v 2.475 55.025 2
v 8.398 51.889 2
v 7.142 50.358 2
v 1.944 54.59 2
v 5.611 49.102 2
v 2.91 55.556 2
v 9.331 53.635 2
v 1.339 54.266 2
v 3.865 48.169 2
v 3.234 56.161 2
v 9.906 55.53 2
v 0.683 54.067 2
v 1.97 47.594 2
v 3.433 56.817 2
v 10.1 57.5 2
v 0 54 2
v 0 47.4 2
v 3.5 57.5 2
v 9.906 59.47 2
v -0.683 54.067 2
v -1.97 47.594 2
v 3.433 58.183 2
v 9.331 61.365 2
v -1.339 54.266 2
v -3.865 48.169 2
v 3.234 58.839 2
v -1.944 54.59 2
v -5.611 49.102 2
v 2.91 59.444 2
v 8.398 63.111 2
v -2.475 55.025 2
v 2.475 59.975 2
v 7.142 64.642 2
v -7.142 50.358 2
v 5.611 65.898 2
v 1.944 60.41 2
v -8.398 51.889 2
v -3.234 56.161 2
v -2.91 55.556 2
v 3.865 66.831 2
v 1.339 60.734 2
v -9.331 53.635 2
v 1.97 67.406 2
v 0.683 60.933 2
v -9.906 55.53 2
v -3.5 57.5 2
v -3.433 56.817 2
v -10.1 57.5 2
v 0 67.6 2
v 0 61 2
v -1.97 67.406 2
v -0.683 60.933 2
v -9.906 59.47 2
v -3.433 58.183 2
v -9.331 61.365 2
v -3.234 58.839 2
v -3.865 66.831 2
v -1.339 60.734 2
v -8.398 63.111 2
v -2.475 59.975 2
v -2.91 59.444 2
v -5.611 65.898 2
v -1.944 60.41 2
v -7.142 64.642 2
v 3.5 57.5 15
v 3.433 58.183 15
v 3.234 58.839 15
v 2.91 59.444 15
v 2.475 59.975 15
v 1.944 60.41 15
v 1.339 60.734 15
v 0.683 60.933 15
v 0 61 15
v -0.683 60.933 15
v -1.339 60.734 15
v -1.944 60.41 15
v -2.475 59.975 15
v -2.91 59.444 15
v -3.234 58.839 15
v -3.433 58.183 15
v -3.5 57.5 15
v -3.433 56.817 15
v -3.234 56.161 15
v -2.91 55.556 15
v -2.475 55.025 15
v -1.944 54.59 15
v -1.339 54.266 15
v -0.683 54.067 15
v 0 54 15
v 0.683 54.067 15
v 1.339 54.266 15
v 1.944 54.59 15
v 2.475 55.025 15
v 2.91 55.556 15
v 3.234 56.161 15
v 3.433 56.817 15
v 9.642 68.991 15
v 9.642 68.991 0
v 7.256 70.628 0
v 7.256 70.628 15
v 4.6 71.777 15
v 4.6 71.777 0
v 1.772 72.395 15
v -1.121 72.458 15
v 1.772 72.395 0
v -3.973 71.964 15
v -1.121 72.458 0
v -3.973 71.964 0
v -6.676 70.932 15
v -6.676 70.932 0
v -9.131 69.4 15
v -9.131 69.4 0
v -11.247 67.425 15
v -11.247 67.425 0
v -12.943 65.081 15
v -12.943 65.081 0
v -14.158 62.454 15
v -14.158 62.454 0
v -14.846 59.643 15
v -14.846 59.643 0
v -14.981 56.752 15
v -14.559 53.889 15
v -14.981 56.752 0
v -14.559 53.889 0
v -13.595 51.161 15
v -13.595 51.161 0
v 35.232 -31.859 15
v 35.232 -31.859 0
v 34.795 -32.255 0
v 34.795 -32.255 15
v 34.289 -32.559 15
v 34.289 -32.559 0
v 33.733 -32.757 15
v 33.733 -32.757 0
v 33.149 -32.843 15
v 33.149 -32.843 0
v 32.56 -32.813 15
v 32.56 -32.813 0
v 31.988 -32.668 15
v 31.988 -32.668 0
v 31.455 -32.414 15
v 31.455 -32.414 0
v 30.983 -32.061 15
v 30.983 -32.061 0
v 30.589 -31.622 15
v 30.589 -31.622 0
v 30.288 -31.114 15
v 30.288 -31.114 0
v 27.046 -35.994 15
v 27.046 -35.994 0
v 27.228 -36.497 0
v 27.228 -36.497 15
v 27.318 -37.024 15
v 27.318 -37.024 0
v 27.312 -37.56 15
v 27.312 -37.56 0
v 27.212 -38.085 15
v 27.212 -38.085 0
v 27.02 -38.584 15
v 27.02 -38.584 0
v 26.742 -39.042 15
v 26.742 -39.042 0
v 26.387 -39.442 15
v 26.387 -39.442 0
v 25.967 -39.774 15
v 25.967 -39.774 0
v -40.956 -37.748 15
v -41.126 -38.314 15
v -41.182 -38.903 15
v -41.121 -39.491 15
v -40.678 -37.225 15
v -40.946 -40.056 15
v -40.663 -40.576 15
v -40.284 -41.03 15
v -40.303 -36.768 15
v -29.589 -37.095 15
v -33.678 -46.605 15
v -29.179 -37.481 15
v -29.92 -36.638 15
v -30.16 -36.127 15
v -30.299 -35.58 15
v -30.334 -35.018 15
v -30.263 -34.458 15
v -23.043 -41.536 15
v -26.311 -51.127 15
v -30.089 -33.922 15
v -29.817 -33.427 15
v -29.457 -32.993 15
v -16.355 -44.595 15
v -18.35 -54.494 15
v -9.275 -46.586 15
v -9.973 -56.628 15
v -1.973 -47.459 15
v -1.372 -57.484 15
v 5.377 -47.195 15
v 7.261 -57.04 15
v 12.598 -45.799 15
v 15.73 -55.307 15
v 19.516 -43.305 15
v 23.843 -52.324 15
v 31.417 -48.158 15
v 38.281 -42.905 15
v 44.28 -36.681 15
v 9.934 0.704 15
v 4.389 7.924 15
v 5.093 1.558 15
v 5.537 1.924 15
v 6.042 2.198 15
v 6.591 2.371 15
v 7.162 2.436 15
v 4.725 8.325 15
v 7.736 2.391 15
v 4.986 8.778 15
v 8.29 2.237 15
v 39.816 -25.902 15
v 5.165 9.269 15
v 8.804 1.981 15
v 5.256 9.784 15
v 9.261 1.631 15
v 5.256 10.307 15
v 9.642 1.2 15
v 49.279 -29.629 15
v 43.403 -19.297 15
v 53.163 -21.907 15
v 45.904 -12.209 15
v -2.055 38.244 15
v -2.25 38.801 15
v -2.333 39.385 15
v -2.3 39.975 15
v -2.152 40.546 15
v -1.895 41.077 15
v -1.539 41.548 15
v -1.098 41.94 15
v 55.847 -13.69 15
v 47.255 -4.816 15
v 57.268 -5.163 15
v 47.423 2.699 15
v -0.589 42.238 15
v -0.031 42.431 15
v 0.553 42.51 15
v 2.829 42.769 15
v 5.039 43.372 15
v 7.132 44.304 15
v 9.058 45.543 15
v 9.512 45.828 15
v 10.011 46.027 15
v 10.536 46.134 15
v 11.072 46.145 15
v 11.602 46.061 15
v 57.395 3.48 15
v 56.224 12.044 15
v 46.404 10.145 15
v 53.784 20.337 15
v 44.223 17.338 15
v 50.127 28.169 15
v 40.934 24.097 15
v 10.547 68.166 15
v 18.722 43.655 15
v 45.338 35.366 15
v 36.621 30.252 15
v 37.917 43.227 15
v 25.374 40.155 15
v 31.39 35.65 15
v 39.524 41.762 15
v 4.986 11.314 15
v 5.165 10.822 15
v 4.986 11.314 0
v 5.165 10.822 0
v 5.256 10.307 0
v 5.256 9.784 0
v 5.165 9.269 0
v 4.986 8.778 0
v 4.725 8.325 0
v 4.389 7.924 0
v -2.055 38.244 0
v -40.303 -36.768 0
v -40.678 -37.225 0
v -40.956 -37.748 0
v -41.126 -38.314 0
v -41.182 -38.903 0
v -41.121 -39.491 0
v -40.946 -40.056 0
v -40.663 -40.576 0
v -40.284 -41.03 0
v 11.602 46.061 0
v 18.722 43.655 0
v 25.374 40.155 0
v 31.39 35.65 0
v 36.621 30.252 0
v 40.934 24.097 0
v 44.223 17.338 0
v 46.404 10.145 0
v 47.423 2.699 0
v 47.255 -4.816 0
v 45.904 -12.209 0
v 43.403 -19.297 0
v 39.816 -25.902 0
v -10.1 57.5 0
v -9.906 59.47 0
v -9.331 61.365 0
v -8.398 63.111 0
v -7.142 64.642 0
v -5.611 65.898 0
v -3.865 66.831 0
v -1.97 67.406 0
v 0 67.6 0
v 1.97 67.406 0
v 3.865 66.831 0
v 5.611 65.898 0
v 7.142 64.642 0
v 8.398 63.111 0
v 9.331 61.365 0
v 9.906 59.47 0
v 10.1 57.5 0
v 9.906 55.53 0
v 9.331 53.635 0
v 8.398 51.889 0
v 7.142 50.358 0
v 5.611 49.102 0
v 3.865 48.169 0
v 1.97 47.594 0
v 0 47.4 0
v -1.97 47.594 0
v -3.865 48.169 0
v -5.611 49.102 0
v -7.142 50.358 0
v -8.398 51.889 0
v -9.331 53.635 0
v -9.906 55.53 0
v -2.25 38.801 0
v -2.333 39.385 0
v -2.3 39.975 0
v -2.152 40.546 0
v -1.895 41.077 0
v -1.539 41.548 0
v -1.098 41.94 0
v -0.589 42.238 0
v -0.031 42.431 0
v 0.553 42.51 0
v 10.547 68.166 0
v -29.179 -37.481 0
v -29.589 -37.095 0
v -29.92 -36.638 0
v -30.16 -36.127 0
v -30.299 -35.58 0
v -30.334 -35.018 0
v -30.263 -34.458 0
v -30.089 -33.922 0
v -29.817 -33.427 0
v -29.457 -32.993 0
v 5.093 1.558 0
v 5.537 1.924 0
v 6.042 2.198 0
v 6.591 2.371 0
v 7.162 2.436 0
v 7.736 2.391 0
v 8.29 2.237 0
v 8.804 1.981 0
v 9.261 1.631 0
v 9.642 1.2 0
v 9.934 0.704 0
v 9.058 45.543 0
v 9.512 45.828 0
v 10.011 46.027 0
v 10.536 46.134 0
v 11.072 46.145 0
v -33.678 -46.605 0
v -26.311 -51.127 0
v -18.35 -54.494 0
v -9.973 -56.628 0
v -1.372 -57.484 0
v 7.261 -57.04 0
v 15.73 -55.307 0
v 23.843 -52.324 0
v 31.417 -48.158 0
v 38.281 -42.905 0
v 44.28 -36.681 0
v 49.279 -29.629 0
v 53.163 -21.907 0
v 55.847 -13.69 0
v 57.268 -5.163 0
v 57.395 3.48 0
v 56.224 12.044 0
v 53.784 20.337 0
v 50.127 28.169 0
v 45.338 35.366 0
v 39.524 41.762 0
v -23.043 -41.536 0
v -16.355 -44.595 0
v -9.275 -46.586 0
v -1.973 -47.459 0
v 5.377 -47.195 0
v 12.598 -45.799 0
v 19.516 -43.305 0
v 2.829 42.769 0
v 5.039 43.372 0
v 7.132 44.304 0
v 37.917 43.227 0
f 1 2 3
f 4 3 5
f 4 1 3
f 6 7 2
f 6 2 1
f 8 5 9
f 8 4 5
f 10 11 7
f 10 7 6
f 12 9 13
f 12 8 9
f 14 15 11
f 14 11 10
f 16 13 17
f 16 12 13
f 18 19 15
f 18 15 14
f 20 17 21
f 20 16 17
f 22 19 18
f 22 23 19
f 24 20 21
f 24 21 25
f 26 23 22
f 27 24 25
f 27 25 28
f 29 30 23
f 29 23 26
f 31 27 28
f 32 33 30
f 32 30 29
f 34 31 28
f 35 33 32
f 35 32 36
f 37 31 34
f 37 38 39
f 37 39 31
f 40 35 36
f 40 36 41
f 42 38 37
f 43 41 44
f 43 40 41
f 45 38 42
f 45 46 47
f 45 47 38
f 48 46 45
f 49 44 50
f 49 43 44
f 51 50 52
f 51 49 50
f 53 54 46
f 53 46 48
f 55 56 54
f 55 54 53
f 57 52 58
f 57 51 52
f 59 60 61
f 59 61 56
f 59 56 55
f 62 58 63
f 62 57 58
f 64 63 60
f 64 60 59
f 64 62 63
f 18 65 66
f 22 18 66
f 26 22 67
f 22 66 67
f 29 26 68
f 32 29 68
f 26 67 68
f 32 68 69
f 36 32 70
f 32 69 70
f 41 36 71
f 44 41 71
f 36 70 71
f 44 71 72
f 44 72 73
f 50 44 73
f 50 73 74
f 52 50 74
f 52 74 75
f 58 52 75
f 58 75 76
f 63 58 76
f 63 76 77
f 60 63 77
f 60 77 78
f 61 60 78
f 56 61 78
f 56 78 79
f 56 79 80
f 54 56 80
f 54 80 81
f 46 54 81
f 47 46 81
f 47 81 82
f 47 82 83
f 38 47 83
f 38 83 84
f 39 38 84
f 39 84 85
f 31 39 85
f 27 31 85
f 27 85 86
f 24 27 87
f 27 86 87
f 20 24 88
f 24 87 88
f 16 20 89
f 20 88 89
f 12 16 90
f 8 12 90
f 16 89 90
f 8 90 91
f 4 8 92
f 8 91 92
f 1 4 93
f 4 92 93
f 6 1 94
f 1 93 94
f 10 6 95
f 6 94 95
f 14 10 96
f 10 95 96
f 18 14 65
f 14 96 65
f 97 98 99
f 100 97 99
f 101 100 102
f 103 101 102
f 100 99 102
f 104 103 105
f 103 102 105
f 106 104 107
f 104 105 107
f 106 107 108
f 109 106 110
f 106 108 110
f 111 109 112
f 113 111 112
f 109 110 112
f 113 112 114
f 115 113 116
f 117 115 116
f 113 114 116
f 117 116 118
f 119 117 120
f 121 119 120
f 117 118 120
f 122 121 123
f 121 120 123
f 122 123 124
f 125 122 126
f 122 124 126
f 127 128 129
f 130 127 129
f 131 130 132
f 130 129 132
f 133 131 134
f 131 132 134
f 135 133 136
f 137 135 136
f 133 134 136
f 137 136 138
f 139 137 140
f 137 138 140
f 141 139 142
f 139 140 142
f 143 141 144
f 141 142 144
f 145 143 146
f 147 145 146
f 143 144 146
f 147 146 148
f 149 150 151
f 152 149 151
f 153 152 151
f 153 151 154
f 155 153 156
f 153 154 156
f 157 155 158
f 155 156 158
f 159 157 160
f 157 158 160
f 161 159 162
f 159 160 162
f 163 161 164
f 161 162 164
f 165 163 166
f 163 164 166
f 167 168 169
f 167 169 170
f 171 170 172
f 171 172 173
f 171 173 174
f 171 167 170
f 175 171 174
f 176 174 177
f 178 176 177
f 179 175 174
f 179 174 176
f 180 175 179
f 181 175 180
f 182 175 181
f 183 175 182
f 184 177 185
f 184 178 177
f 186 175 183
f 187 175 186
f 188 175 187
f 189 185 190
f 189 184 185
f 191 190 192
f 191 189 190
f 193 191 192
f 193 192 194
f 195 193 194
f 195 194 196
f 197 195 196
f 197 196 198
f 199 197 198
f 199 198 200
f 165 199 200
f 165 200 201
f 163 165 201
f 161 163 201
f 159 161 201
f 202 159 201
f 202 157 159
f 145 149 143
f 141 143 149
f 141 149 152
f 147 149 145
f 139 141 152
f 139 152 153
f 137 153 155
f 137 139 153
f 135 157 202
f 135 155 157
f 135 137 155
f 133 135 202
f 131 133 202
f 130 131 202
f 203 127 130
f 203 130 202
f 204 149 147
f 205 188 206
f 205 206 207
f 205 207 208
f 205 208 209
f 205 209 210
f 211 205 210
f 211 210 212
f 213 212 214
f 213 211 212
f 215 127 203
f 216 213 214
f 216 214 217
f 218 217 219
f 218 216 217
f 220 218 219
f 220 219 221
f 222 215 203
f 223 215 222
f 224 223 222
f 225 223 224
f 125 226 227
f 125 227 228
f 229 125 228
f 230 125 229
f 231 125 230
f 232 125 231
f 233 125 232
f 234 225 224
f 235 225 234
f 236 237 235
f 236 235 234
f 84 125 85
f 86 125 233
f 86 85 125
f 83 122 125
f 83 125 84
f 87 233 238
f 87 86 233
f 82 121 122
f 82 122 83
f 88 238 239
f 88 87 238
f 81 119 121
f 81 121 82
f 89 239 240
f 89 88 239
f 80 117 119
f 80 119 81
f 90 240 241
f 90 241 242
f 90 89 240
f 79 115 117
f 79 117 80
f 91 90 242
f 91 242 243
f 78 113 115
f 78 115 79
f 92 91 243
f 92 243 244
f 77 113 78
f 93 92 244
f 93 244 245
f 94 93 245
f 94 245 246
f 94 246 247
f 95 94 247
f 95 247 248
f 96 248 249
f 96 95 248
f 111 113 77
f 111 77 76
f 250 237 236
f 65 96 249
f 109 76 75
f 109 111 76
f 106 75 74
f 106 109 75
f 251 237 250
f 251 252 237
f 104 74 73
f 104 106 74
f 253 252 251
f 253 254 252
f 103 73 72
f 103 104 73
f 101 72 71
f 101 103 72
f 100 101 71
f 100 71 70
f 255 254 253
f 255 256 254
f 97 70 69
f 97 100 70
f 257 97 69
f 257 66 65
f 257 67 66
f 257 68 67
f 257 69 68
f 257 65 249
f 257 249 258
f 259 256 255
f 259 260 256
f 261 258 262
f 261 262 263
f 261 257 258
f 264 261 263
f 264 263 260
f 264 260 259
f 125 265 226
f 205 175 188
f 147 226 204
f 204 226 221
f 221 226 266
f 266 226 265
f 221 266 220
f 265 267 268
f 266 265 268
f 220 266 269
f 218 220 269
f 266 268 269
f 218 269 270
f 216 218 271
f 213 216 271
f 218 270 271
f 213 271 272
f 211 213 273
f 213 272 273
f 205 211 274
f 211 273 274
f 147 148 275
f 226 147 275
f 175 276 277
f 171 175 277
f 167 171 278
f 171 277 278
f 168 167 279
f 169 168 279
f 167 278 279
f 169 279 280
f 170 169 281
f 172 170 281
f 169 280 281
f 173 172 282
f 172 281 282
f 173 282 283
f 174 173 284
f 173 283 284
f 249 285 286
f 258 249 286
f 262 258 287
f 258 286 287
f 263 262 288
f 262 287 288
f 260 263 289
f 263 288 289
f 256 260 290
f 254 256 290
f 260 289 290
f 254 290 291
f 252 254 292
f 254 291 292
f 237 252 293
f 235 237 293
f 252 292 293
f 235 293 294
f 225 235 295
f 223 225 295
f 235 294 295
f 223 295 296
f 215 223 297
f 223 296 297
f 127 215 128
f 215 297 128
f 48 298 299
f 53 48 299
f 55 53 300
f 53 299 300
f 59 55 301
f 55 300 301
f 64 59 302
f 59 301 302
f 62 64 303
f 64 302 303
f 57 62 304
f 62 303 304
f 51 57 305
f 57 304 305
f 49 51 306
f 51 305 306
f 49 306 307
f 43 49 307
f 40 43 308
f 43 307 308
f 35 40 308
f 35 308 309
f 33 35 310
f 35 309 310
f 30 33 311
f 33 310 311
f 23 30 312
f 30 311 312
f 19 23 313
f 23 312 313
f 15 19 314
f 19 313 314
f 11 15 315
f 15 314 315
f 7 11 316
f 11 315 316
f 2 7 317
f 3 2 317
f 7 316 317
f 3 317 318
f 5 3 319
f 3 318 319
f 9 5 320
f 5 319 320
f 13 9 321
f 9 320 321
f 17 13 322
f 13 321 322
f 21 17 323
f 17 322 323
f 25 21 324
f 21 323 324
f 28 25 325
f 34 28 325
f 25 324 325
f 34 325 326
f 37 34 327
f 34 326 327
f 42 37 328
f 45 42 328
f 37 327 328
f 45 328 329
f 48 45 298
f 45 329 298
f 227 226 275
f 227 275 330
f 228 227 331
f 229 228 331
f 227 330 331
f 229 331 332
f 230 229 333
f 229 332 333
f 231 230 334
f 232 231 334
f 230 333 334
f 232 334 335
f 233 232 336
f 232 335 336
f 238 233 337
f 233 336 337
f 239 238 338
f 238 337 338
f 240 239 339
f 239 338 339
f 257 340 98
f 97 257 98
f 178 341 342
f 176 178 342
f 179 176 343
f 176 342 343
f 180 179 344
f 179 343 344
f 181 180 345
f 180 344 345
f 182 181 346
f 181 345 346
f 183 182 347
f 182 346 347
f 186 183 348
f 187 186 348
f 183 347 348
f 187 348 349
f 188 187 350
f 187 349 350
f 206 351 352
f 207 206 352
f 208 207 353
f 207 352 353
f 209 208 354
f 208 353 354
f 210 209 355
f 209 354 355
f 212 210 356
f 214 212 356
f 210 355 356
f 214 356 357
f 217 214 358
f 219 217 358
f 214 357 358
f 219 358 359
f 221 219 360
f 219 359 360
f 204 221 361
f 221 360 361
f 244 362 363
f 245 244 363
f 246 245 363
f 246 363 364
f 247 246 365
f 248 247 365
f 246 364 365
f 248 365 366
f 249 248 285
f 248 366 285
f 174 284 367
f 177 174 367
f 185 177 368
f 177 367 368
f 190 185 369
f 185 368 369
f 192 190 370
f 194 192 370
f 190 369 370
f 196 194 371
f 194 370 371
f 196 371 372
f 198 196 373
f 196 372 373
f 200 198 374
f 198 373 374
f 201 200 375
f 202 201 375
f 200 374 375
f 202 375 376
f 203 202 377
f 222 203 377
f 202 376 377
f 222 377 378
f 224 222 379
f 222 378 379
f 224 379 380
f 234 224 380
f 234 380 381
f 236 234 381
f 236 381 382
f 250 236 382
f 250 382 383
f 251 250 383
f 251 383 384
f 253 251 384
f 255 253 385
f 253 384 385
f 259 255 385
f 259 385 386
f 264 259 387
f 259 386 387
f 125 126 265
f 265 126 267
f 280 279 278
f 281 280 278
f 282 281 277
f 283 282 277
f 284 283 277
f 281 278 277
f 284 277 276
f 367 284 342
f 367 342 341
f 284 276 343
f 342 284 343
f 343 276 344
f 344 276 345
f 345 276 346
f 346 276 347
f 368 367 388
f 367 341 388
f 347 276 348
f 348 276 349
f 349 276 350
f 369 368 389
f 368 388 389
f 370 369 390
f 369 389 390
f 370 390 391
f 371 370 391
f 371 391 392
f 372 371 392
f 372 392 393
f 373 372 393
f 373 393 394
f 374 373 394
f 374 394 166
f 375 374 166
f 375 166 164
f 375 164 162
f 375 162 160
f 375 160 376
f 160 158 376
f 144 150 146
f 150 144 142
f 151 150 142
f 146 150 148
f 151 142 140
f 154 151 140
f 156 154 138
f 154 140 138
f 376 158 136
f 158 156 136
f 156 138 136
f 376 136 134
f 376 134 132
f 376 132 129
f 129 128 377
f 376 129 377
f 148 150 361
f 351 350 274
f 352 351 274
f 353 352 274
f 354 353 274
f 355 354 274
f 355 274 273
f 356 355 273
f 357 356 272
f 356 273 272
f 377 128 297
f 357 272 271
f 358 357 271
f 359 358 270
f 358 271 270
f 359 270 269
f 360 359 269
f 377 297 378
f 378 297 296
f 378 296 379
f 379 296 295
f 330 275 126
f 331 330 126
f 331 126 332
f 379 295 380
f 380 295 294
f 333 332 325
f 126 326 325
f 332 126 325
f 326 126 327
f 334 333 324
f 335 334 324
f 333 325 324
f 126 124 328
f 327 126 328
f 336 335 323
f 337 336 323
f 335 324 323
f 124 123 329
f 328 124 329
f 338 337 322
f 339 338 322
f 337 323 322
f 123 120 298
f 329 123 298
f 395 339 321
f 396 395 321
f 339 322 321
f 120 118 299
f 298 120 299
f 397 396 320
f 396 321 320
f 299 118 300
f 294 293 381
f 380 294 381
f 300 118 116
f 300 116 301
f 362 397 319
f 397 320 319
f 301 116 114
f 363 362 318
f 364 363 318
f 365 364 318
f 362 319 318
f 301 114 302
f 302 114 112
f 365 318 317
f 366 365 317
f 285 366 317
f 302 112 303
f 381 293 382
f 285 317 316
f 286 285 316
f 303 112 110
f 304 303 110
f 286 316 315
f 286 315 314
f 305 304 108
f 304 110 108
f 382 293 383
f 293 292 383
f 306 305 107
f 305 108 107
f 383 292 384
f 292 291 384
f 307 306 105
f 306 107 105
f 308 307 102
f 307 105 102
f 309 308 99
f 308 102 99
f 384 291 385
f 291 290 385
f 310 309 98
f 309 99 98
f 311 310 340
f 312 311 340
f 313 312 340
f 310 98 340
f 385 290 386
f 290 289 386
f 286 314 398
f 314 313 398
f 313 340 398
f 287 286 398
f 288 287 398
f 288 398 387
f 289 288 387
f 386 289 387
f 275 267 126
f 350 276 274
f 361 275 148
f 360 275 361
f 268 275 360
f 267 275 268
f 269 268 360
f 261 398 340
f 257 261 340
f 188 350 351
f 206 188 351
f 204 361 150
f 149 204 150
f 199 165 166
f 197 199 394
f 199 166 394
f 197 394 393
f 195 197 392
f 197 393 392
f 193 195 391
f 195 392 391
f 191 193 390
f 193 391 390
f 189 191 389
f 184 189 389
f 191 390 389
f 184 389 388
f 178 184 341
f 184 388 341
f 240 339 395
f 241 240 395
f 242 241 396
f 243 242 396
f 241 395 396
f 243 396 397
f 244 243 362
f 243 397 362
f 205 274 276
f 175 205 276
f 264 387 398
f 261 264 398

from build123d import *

# Parameters (mm, degrees)
EXTRUDE_1_DEPTH     = 15
SKETCH_6_R          = 3.5
CUT_EXTRUDE_2_DEPTH = 15
SKETCH_8_R          = 10.1
CUT_EXTRUDE_4_DEPTH = 2


with BuildPart() as part:
    # ｽｹｯﾁ1 → ﾎﾞｽ - 押し出し1 (new body)
    with BuildSketch(Plane.XY):
        with BuildLine():
            Line((10.546944731, 68.165925034), (9.641814145, 68.990666647))
            ThreePointArc((9.641814145, 68.990666647), (-9.131421435, 69.400300104), (-13.594616806, 51.160726074))
            Line((-13.594616806, 51.160726074), (4.986432096, 11.313538113))
            ThreePointArc((4.986432096, 11.313538113), (5.221931994, 9.524738795), (4.388829079, 7.924362985))
            Line((4.388829079, 7.924362985), (-40.303464689, -36.767930783))
            ThreePointArc((-40.303464689, -36.767930783), (-41.182112782, -38.903012739), (-40.283913759, -41.029943849))
            ThreePointArc((-40.283913759, -41.029943849), (41.397896806, -39.905690573), (39.524106652, 41.762363359))
            Line((39.524106652, 41.762363359), (37.916838192, 43.226882625))
            Line((37.916838192, 43.226882625), (10.546944731, 68.165925034))
        make_face()
        with BuildLine():
            ThreePointArc((5.093338956, 1.55780505), (7.735603832, 2.390907965), (9.933582661, 0.704339492))
            Line((9.933582661, 0.704339492), (27.046217634, -35.993824637))
            ThreePointArc((27.046217634, -35.993824637), (27.212084573, -38.085077821), (25.967336583, -39.773702754))
            ThreePointArc((25.967336583, -39.773702754), (-1.972837213, -47.459012983), (-29.17877254, -37.481318454))
            ThreePointArc((-29.17877254, -37.481318454), (-30.330146685, -35.299826939), (-29.457223039, -32.992756945))
            Line((-29.457223039, -32.992756945), (5.093338956, 1.55780505))
        make_face(mode=Mode.SUBTRACT)
        with BuildLine():
            ThreePointArc((35.231836325, -31.858557864), (32.560090836, -32.813013733), (30.287744354, -31.114293205))
            Line((30.287744354, -31.114293205), (-2.054746852, 38.244403012))
            ThreePointArc((-2.054746852, 38.244403012), (-1.895310582, 41.077194163), (0.553480425, 42.510214831))
            ThreePointArc((0.553480425, 42.510214831), (5.039223996, 43.371793408), (9.057681155, 45.543478261))
            ThreePointArc((9.057681155, 45.543478261), (10.270904088, 46.091905397), (11.601973614, 46.061309233))
            ThreePointArc((11.601973614, 46.061309233), (45.455779175, 13.784851815), (35.231836325, -31.858557864))
        make_face(mode=Mode.SUBTRACT)
    extrude(amount=EXTRUDE_1_DEPTH)

    # ｽｹｯﾁ6 → ｶｯﾄ - 押し出し2 (cut)
    with BuildSketch(Plane.XY.offset(15)):
        with Locations((0, 57.5)):
            Circle(SKETCH_6_R)
    extrude(amount=-CUT_EXTRUDE_2_DEPTH, mode=Mode.SUBTRACT)

    # ｽｹｯﾁ8 → ｶｯﾄ - 押し出し4 (cut)
    with BuildSketch(Plane(origin=(0, 0, 0), x_dir=(-1, 0, 0), z_dir=(0, 0, -1))):
        with Locations((0, 57.5)):
            Circle(SKETCH_8_R)
    extrude(amount=-CUT_EXTRUDE_4_DEPTH, mode=Mode.SUBTRACT)


solid = part.part
